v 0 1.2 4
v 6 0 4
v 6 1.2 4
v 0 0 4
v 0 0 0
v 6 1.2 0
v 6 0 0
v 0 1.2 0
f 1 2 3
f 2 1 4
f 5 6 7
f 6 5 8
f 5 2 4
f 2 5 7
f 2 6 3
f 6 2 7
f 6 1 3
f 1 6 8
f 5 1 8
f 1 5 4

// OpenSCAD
/* [Global] */
// Model quality
quality = 64; // [16:16:128]

/* [Shapes] */
// How many copies
copies = 3;
// Wall thickness (mm)
wall = 1.2;
// Label
label = "hello"; // 32
// Shape family
family = "round"; // [round, square, hex]
// Grid size
grid = 2; // [1, 2, 4, 8]
// Add a lid
lid = true;
// Ramp angle
ramp = 30; // [0:5:90]

/* [Appearance] */
// Body colour
body_colour = "#00ff88"; // color
// Label font
label_font = "DejaVu Sans"; // font

/* [Hidden] */
secret = 42;

cube([copies * grid, wall, quality / 16]);
